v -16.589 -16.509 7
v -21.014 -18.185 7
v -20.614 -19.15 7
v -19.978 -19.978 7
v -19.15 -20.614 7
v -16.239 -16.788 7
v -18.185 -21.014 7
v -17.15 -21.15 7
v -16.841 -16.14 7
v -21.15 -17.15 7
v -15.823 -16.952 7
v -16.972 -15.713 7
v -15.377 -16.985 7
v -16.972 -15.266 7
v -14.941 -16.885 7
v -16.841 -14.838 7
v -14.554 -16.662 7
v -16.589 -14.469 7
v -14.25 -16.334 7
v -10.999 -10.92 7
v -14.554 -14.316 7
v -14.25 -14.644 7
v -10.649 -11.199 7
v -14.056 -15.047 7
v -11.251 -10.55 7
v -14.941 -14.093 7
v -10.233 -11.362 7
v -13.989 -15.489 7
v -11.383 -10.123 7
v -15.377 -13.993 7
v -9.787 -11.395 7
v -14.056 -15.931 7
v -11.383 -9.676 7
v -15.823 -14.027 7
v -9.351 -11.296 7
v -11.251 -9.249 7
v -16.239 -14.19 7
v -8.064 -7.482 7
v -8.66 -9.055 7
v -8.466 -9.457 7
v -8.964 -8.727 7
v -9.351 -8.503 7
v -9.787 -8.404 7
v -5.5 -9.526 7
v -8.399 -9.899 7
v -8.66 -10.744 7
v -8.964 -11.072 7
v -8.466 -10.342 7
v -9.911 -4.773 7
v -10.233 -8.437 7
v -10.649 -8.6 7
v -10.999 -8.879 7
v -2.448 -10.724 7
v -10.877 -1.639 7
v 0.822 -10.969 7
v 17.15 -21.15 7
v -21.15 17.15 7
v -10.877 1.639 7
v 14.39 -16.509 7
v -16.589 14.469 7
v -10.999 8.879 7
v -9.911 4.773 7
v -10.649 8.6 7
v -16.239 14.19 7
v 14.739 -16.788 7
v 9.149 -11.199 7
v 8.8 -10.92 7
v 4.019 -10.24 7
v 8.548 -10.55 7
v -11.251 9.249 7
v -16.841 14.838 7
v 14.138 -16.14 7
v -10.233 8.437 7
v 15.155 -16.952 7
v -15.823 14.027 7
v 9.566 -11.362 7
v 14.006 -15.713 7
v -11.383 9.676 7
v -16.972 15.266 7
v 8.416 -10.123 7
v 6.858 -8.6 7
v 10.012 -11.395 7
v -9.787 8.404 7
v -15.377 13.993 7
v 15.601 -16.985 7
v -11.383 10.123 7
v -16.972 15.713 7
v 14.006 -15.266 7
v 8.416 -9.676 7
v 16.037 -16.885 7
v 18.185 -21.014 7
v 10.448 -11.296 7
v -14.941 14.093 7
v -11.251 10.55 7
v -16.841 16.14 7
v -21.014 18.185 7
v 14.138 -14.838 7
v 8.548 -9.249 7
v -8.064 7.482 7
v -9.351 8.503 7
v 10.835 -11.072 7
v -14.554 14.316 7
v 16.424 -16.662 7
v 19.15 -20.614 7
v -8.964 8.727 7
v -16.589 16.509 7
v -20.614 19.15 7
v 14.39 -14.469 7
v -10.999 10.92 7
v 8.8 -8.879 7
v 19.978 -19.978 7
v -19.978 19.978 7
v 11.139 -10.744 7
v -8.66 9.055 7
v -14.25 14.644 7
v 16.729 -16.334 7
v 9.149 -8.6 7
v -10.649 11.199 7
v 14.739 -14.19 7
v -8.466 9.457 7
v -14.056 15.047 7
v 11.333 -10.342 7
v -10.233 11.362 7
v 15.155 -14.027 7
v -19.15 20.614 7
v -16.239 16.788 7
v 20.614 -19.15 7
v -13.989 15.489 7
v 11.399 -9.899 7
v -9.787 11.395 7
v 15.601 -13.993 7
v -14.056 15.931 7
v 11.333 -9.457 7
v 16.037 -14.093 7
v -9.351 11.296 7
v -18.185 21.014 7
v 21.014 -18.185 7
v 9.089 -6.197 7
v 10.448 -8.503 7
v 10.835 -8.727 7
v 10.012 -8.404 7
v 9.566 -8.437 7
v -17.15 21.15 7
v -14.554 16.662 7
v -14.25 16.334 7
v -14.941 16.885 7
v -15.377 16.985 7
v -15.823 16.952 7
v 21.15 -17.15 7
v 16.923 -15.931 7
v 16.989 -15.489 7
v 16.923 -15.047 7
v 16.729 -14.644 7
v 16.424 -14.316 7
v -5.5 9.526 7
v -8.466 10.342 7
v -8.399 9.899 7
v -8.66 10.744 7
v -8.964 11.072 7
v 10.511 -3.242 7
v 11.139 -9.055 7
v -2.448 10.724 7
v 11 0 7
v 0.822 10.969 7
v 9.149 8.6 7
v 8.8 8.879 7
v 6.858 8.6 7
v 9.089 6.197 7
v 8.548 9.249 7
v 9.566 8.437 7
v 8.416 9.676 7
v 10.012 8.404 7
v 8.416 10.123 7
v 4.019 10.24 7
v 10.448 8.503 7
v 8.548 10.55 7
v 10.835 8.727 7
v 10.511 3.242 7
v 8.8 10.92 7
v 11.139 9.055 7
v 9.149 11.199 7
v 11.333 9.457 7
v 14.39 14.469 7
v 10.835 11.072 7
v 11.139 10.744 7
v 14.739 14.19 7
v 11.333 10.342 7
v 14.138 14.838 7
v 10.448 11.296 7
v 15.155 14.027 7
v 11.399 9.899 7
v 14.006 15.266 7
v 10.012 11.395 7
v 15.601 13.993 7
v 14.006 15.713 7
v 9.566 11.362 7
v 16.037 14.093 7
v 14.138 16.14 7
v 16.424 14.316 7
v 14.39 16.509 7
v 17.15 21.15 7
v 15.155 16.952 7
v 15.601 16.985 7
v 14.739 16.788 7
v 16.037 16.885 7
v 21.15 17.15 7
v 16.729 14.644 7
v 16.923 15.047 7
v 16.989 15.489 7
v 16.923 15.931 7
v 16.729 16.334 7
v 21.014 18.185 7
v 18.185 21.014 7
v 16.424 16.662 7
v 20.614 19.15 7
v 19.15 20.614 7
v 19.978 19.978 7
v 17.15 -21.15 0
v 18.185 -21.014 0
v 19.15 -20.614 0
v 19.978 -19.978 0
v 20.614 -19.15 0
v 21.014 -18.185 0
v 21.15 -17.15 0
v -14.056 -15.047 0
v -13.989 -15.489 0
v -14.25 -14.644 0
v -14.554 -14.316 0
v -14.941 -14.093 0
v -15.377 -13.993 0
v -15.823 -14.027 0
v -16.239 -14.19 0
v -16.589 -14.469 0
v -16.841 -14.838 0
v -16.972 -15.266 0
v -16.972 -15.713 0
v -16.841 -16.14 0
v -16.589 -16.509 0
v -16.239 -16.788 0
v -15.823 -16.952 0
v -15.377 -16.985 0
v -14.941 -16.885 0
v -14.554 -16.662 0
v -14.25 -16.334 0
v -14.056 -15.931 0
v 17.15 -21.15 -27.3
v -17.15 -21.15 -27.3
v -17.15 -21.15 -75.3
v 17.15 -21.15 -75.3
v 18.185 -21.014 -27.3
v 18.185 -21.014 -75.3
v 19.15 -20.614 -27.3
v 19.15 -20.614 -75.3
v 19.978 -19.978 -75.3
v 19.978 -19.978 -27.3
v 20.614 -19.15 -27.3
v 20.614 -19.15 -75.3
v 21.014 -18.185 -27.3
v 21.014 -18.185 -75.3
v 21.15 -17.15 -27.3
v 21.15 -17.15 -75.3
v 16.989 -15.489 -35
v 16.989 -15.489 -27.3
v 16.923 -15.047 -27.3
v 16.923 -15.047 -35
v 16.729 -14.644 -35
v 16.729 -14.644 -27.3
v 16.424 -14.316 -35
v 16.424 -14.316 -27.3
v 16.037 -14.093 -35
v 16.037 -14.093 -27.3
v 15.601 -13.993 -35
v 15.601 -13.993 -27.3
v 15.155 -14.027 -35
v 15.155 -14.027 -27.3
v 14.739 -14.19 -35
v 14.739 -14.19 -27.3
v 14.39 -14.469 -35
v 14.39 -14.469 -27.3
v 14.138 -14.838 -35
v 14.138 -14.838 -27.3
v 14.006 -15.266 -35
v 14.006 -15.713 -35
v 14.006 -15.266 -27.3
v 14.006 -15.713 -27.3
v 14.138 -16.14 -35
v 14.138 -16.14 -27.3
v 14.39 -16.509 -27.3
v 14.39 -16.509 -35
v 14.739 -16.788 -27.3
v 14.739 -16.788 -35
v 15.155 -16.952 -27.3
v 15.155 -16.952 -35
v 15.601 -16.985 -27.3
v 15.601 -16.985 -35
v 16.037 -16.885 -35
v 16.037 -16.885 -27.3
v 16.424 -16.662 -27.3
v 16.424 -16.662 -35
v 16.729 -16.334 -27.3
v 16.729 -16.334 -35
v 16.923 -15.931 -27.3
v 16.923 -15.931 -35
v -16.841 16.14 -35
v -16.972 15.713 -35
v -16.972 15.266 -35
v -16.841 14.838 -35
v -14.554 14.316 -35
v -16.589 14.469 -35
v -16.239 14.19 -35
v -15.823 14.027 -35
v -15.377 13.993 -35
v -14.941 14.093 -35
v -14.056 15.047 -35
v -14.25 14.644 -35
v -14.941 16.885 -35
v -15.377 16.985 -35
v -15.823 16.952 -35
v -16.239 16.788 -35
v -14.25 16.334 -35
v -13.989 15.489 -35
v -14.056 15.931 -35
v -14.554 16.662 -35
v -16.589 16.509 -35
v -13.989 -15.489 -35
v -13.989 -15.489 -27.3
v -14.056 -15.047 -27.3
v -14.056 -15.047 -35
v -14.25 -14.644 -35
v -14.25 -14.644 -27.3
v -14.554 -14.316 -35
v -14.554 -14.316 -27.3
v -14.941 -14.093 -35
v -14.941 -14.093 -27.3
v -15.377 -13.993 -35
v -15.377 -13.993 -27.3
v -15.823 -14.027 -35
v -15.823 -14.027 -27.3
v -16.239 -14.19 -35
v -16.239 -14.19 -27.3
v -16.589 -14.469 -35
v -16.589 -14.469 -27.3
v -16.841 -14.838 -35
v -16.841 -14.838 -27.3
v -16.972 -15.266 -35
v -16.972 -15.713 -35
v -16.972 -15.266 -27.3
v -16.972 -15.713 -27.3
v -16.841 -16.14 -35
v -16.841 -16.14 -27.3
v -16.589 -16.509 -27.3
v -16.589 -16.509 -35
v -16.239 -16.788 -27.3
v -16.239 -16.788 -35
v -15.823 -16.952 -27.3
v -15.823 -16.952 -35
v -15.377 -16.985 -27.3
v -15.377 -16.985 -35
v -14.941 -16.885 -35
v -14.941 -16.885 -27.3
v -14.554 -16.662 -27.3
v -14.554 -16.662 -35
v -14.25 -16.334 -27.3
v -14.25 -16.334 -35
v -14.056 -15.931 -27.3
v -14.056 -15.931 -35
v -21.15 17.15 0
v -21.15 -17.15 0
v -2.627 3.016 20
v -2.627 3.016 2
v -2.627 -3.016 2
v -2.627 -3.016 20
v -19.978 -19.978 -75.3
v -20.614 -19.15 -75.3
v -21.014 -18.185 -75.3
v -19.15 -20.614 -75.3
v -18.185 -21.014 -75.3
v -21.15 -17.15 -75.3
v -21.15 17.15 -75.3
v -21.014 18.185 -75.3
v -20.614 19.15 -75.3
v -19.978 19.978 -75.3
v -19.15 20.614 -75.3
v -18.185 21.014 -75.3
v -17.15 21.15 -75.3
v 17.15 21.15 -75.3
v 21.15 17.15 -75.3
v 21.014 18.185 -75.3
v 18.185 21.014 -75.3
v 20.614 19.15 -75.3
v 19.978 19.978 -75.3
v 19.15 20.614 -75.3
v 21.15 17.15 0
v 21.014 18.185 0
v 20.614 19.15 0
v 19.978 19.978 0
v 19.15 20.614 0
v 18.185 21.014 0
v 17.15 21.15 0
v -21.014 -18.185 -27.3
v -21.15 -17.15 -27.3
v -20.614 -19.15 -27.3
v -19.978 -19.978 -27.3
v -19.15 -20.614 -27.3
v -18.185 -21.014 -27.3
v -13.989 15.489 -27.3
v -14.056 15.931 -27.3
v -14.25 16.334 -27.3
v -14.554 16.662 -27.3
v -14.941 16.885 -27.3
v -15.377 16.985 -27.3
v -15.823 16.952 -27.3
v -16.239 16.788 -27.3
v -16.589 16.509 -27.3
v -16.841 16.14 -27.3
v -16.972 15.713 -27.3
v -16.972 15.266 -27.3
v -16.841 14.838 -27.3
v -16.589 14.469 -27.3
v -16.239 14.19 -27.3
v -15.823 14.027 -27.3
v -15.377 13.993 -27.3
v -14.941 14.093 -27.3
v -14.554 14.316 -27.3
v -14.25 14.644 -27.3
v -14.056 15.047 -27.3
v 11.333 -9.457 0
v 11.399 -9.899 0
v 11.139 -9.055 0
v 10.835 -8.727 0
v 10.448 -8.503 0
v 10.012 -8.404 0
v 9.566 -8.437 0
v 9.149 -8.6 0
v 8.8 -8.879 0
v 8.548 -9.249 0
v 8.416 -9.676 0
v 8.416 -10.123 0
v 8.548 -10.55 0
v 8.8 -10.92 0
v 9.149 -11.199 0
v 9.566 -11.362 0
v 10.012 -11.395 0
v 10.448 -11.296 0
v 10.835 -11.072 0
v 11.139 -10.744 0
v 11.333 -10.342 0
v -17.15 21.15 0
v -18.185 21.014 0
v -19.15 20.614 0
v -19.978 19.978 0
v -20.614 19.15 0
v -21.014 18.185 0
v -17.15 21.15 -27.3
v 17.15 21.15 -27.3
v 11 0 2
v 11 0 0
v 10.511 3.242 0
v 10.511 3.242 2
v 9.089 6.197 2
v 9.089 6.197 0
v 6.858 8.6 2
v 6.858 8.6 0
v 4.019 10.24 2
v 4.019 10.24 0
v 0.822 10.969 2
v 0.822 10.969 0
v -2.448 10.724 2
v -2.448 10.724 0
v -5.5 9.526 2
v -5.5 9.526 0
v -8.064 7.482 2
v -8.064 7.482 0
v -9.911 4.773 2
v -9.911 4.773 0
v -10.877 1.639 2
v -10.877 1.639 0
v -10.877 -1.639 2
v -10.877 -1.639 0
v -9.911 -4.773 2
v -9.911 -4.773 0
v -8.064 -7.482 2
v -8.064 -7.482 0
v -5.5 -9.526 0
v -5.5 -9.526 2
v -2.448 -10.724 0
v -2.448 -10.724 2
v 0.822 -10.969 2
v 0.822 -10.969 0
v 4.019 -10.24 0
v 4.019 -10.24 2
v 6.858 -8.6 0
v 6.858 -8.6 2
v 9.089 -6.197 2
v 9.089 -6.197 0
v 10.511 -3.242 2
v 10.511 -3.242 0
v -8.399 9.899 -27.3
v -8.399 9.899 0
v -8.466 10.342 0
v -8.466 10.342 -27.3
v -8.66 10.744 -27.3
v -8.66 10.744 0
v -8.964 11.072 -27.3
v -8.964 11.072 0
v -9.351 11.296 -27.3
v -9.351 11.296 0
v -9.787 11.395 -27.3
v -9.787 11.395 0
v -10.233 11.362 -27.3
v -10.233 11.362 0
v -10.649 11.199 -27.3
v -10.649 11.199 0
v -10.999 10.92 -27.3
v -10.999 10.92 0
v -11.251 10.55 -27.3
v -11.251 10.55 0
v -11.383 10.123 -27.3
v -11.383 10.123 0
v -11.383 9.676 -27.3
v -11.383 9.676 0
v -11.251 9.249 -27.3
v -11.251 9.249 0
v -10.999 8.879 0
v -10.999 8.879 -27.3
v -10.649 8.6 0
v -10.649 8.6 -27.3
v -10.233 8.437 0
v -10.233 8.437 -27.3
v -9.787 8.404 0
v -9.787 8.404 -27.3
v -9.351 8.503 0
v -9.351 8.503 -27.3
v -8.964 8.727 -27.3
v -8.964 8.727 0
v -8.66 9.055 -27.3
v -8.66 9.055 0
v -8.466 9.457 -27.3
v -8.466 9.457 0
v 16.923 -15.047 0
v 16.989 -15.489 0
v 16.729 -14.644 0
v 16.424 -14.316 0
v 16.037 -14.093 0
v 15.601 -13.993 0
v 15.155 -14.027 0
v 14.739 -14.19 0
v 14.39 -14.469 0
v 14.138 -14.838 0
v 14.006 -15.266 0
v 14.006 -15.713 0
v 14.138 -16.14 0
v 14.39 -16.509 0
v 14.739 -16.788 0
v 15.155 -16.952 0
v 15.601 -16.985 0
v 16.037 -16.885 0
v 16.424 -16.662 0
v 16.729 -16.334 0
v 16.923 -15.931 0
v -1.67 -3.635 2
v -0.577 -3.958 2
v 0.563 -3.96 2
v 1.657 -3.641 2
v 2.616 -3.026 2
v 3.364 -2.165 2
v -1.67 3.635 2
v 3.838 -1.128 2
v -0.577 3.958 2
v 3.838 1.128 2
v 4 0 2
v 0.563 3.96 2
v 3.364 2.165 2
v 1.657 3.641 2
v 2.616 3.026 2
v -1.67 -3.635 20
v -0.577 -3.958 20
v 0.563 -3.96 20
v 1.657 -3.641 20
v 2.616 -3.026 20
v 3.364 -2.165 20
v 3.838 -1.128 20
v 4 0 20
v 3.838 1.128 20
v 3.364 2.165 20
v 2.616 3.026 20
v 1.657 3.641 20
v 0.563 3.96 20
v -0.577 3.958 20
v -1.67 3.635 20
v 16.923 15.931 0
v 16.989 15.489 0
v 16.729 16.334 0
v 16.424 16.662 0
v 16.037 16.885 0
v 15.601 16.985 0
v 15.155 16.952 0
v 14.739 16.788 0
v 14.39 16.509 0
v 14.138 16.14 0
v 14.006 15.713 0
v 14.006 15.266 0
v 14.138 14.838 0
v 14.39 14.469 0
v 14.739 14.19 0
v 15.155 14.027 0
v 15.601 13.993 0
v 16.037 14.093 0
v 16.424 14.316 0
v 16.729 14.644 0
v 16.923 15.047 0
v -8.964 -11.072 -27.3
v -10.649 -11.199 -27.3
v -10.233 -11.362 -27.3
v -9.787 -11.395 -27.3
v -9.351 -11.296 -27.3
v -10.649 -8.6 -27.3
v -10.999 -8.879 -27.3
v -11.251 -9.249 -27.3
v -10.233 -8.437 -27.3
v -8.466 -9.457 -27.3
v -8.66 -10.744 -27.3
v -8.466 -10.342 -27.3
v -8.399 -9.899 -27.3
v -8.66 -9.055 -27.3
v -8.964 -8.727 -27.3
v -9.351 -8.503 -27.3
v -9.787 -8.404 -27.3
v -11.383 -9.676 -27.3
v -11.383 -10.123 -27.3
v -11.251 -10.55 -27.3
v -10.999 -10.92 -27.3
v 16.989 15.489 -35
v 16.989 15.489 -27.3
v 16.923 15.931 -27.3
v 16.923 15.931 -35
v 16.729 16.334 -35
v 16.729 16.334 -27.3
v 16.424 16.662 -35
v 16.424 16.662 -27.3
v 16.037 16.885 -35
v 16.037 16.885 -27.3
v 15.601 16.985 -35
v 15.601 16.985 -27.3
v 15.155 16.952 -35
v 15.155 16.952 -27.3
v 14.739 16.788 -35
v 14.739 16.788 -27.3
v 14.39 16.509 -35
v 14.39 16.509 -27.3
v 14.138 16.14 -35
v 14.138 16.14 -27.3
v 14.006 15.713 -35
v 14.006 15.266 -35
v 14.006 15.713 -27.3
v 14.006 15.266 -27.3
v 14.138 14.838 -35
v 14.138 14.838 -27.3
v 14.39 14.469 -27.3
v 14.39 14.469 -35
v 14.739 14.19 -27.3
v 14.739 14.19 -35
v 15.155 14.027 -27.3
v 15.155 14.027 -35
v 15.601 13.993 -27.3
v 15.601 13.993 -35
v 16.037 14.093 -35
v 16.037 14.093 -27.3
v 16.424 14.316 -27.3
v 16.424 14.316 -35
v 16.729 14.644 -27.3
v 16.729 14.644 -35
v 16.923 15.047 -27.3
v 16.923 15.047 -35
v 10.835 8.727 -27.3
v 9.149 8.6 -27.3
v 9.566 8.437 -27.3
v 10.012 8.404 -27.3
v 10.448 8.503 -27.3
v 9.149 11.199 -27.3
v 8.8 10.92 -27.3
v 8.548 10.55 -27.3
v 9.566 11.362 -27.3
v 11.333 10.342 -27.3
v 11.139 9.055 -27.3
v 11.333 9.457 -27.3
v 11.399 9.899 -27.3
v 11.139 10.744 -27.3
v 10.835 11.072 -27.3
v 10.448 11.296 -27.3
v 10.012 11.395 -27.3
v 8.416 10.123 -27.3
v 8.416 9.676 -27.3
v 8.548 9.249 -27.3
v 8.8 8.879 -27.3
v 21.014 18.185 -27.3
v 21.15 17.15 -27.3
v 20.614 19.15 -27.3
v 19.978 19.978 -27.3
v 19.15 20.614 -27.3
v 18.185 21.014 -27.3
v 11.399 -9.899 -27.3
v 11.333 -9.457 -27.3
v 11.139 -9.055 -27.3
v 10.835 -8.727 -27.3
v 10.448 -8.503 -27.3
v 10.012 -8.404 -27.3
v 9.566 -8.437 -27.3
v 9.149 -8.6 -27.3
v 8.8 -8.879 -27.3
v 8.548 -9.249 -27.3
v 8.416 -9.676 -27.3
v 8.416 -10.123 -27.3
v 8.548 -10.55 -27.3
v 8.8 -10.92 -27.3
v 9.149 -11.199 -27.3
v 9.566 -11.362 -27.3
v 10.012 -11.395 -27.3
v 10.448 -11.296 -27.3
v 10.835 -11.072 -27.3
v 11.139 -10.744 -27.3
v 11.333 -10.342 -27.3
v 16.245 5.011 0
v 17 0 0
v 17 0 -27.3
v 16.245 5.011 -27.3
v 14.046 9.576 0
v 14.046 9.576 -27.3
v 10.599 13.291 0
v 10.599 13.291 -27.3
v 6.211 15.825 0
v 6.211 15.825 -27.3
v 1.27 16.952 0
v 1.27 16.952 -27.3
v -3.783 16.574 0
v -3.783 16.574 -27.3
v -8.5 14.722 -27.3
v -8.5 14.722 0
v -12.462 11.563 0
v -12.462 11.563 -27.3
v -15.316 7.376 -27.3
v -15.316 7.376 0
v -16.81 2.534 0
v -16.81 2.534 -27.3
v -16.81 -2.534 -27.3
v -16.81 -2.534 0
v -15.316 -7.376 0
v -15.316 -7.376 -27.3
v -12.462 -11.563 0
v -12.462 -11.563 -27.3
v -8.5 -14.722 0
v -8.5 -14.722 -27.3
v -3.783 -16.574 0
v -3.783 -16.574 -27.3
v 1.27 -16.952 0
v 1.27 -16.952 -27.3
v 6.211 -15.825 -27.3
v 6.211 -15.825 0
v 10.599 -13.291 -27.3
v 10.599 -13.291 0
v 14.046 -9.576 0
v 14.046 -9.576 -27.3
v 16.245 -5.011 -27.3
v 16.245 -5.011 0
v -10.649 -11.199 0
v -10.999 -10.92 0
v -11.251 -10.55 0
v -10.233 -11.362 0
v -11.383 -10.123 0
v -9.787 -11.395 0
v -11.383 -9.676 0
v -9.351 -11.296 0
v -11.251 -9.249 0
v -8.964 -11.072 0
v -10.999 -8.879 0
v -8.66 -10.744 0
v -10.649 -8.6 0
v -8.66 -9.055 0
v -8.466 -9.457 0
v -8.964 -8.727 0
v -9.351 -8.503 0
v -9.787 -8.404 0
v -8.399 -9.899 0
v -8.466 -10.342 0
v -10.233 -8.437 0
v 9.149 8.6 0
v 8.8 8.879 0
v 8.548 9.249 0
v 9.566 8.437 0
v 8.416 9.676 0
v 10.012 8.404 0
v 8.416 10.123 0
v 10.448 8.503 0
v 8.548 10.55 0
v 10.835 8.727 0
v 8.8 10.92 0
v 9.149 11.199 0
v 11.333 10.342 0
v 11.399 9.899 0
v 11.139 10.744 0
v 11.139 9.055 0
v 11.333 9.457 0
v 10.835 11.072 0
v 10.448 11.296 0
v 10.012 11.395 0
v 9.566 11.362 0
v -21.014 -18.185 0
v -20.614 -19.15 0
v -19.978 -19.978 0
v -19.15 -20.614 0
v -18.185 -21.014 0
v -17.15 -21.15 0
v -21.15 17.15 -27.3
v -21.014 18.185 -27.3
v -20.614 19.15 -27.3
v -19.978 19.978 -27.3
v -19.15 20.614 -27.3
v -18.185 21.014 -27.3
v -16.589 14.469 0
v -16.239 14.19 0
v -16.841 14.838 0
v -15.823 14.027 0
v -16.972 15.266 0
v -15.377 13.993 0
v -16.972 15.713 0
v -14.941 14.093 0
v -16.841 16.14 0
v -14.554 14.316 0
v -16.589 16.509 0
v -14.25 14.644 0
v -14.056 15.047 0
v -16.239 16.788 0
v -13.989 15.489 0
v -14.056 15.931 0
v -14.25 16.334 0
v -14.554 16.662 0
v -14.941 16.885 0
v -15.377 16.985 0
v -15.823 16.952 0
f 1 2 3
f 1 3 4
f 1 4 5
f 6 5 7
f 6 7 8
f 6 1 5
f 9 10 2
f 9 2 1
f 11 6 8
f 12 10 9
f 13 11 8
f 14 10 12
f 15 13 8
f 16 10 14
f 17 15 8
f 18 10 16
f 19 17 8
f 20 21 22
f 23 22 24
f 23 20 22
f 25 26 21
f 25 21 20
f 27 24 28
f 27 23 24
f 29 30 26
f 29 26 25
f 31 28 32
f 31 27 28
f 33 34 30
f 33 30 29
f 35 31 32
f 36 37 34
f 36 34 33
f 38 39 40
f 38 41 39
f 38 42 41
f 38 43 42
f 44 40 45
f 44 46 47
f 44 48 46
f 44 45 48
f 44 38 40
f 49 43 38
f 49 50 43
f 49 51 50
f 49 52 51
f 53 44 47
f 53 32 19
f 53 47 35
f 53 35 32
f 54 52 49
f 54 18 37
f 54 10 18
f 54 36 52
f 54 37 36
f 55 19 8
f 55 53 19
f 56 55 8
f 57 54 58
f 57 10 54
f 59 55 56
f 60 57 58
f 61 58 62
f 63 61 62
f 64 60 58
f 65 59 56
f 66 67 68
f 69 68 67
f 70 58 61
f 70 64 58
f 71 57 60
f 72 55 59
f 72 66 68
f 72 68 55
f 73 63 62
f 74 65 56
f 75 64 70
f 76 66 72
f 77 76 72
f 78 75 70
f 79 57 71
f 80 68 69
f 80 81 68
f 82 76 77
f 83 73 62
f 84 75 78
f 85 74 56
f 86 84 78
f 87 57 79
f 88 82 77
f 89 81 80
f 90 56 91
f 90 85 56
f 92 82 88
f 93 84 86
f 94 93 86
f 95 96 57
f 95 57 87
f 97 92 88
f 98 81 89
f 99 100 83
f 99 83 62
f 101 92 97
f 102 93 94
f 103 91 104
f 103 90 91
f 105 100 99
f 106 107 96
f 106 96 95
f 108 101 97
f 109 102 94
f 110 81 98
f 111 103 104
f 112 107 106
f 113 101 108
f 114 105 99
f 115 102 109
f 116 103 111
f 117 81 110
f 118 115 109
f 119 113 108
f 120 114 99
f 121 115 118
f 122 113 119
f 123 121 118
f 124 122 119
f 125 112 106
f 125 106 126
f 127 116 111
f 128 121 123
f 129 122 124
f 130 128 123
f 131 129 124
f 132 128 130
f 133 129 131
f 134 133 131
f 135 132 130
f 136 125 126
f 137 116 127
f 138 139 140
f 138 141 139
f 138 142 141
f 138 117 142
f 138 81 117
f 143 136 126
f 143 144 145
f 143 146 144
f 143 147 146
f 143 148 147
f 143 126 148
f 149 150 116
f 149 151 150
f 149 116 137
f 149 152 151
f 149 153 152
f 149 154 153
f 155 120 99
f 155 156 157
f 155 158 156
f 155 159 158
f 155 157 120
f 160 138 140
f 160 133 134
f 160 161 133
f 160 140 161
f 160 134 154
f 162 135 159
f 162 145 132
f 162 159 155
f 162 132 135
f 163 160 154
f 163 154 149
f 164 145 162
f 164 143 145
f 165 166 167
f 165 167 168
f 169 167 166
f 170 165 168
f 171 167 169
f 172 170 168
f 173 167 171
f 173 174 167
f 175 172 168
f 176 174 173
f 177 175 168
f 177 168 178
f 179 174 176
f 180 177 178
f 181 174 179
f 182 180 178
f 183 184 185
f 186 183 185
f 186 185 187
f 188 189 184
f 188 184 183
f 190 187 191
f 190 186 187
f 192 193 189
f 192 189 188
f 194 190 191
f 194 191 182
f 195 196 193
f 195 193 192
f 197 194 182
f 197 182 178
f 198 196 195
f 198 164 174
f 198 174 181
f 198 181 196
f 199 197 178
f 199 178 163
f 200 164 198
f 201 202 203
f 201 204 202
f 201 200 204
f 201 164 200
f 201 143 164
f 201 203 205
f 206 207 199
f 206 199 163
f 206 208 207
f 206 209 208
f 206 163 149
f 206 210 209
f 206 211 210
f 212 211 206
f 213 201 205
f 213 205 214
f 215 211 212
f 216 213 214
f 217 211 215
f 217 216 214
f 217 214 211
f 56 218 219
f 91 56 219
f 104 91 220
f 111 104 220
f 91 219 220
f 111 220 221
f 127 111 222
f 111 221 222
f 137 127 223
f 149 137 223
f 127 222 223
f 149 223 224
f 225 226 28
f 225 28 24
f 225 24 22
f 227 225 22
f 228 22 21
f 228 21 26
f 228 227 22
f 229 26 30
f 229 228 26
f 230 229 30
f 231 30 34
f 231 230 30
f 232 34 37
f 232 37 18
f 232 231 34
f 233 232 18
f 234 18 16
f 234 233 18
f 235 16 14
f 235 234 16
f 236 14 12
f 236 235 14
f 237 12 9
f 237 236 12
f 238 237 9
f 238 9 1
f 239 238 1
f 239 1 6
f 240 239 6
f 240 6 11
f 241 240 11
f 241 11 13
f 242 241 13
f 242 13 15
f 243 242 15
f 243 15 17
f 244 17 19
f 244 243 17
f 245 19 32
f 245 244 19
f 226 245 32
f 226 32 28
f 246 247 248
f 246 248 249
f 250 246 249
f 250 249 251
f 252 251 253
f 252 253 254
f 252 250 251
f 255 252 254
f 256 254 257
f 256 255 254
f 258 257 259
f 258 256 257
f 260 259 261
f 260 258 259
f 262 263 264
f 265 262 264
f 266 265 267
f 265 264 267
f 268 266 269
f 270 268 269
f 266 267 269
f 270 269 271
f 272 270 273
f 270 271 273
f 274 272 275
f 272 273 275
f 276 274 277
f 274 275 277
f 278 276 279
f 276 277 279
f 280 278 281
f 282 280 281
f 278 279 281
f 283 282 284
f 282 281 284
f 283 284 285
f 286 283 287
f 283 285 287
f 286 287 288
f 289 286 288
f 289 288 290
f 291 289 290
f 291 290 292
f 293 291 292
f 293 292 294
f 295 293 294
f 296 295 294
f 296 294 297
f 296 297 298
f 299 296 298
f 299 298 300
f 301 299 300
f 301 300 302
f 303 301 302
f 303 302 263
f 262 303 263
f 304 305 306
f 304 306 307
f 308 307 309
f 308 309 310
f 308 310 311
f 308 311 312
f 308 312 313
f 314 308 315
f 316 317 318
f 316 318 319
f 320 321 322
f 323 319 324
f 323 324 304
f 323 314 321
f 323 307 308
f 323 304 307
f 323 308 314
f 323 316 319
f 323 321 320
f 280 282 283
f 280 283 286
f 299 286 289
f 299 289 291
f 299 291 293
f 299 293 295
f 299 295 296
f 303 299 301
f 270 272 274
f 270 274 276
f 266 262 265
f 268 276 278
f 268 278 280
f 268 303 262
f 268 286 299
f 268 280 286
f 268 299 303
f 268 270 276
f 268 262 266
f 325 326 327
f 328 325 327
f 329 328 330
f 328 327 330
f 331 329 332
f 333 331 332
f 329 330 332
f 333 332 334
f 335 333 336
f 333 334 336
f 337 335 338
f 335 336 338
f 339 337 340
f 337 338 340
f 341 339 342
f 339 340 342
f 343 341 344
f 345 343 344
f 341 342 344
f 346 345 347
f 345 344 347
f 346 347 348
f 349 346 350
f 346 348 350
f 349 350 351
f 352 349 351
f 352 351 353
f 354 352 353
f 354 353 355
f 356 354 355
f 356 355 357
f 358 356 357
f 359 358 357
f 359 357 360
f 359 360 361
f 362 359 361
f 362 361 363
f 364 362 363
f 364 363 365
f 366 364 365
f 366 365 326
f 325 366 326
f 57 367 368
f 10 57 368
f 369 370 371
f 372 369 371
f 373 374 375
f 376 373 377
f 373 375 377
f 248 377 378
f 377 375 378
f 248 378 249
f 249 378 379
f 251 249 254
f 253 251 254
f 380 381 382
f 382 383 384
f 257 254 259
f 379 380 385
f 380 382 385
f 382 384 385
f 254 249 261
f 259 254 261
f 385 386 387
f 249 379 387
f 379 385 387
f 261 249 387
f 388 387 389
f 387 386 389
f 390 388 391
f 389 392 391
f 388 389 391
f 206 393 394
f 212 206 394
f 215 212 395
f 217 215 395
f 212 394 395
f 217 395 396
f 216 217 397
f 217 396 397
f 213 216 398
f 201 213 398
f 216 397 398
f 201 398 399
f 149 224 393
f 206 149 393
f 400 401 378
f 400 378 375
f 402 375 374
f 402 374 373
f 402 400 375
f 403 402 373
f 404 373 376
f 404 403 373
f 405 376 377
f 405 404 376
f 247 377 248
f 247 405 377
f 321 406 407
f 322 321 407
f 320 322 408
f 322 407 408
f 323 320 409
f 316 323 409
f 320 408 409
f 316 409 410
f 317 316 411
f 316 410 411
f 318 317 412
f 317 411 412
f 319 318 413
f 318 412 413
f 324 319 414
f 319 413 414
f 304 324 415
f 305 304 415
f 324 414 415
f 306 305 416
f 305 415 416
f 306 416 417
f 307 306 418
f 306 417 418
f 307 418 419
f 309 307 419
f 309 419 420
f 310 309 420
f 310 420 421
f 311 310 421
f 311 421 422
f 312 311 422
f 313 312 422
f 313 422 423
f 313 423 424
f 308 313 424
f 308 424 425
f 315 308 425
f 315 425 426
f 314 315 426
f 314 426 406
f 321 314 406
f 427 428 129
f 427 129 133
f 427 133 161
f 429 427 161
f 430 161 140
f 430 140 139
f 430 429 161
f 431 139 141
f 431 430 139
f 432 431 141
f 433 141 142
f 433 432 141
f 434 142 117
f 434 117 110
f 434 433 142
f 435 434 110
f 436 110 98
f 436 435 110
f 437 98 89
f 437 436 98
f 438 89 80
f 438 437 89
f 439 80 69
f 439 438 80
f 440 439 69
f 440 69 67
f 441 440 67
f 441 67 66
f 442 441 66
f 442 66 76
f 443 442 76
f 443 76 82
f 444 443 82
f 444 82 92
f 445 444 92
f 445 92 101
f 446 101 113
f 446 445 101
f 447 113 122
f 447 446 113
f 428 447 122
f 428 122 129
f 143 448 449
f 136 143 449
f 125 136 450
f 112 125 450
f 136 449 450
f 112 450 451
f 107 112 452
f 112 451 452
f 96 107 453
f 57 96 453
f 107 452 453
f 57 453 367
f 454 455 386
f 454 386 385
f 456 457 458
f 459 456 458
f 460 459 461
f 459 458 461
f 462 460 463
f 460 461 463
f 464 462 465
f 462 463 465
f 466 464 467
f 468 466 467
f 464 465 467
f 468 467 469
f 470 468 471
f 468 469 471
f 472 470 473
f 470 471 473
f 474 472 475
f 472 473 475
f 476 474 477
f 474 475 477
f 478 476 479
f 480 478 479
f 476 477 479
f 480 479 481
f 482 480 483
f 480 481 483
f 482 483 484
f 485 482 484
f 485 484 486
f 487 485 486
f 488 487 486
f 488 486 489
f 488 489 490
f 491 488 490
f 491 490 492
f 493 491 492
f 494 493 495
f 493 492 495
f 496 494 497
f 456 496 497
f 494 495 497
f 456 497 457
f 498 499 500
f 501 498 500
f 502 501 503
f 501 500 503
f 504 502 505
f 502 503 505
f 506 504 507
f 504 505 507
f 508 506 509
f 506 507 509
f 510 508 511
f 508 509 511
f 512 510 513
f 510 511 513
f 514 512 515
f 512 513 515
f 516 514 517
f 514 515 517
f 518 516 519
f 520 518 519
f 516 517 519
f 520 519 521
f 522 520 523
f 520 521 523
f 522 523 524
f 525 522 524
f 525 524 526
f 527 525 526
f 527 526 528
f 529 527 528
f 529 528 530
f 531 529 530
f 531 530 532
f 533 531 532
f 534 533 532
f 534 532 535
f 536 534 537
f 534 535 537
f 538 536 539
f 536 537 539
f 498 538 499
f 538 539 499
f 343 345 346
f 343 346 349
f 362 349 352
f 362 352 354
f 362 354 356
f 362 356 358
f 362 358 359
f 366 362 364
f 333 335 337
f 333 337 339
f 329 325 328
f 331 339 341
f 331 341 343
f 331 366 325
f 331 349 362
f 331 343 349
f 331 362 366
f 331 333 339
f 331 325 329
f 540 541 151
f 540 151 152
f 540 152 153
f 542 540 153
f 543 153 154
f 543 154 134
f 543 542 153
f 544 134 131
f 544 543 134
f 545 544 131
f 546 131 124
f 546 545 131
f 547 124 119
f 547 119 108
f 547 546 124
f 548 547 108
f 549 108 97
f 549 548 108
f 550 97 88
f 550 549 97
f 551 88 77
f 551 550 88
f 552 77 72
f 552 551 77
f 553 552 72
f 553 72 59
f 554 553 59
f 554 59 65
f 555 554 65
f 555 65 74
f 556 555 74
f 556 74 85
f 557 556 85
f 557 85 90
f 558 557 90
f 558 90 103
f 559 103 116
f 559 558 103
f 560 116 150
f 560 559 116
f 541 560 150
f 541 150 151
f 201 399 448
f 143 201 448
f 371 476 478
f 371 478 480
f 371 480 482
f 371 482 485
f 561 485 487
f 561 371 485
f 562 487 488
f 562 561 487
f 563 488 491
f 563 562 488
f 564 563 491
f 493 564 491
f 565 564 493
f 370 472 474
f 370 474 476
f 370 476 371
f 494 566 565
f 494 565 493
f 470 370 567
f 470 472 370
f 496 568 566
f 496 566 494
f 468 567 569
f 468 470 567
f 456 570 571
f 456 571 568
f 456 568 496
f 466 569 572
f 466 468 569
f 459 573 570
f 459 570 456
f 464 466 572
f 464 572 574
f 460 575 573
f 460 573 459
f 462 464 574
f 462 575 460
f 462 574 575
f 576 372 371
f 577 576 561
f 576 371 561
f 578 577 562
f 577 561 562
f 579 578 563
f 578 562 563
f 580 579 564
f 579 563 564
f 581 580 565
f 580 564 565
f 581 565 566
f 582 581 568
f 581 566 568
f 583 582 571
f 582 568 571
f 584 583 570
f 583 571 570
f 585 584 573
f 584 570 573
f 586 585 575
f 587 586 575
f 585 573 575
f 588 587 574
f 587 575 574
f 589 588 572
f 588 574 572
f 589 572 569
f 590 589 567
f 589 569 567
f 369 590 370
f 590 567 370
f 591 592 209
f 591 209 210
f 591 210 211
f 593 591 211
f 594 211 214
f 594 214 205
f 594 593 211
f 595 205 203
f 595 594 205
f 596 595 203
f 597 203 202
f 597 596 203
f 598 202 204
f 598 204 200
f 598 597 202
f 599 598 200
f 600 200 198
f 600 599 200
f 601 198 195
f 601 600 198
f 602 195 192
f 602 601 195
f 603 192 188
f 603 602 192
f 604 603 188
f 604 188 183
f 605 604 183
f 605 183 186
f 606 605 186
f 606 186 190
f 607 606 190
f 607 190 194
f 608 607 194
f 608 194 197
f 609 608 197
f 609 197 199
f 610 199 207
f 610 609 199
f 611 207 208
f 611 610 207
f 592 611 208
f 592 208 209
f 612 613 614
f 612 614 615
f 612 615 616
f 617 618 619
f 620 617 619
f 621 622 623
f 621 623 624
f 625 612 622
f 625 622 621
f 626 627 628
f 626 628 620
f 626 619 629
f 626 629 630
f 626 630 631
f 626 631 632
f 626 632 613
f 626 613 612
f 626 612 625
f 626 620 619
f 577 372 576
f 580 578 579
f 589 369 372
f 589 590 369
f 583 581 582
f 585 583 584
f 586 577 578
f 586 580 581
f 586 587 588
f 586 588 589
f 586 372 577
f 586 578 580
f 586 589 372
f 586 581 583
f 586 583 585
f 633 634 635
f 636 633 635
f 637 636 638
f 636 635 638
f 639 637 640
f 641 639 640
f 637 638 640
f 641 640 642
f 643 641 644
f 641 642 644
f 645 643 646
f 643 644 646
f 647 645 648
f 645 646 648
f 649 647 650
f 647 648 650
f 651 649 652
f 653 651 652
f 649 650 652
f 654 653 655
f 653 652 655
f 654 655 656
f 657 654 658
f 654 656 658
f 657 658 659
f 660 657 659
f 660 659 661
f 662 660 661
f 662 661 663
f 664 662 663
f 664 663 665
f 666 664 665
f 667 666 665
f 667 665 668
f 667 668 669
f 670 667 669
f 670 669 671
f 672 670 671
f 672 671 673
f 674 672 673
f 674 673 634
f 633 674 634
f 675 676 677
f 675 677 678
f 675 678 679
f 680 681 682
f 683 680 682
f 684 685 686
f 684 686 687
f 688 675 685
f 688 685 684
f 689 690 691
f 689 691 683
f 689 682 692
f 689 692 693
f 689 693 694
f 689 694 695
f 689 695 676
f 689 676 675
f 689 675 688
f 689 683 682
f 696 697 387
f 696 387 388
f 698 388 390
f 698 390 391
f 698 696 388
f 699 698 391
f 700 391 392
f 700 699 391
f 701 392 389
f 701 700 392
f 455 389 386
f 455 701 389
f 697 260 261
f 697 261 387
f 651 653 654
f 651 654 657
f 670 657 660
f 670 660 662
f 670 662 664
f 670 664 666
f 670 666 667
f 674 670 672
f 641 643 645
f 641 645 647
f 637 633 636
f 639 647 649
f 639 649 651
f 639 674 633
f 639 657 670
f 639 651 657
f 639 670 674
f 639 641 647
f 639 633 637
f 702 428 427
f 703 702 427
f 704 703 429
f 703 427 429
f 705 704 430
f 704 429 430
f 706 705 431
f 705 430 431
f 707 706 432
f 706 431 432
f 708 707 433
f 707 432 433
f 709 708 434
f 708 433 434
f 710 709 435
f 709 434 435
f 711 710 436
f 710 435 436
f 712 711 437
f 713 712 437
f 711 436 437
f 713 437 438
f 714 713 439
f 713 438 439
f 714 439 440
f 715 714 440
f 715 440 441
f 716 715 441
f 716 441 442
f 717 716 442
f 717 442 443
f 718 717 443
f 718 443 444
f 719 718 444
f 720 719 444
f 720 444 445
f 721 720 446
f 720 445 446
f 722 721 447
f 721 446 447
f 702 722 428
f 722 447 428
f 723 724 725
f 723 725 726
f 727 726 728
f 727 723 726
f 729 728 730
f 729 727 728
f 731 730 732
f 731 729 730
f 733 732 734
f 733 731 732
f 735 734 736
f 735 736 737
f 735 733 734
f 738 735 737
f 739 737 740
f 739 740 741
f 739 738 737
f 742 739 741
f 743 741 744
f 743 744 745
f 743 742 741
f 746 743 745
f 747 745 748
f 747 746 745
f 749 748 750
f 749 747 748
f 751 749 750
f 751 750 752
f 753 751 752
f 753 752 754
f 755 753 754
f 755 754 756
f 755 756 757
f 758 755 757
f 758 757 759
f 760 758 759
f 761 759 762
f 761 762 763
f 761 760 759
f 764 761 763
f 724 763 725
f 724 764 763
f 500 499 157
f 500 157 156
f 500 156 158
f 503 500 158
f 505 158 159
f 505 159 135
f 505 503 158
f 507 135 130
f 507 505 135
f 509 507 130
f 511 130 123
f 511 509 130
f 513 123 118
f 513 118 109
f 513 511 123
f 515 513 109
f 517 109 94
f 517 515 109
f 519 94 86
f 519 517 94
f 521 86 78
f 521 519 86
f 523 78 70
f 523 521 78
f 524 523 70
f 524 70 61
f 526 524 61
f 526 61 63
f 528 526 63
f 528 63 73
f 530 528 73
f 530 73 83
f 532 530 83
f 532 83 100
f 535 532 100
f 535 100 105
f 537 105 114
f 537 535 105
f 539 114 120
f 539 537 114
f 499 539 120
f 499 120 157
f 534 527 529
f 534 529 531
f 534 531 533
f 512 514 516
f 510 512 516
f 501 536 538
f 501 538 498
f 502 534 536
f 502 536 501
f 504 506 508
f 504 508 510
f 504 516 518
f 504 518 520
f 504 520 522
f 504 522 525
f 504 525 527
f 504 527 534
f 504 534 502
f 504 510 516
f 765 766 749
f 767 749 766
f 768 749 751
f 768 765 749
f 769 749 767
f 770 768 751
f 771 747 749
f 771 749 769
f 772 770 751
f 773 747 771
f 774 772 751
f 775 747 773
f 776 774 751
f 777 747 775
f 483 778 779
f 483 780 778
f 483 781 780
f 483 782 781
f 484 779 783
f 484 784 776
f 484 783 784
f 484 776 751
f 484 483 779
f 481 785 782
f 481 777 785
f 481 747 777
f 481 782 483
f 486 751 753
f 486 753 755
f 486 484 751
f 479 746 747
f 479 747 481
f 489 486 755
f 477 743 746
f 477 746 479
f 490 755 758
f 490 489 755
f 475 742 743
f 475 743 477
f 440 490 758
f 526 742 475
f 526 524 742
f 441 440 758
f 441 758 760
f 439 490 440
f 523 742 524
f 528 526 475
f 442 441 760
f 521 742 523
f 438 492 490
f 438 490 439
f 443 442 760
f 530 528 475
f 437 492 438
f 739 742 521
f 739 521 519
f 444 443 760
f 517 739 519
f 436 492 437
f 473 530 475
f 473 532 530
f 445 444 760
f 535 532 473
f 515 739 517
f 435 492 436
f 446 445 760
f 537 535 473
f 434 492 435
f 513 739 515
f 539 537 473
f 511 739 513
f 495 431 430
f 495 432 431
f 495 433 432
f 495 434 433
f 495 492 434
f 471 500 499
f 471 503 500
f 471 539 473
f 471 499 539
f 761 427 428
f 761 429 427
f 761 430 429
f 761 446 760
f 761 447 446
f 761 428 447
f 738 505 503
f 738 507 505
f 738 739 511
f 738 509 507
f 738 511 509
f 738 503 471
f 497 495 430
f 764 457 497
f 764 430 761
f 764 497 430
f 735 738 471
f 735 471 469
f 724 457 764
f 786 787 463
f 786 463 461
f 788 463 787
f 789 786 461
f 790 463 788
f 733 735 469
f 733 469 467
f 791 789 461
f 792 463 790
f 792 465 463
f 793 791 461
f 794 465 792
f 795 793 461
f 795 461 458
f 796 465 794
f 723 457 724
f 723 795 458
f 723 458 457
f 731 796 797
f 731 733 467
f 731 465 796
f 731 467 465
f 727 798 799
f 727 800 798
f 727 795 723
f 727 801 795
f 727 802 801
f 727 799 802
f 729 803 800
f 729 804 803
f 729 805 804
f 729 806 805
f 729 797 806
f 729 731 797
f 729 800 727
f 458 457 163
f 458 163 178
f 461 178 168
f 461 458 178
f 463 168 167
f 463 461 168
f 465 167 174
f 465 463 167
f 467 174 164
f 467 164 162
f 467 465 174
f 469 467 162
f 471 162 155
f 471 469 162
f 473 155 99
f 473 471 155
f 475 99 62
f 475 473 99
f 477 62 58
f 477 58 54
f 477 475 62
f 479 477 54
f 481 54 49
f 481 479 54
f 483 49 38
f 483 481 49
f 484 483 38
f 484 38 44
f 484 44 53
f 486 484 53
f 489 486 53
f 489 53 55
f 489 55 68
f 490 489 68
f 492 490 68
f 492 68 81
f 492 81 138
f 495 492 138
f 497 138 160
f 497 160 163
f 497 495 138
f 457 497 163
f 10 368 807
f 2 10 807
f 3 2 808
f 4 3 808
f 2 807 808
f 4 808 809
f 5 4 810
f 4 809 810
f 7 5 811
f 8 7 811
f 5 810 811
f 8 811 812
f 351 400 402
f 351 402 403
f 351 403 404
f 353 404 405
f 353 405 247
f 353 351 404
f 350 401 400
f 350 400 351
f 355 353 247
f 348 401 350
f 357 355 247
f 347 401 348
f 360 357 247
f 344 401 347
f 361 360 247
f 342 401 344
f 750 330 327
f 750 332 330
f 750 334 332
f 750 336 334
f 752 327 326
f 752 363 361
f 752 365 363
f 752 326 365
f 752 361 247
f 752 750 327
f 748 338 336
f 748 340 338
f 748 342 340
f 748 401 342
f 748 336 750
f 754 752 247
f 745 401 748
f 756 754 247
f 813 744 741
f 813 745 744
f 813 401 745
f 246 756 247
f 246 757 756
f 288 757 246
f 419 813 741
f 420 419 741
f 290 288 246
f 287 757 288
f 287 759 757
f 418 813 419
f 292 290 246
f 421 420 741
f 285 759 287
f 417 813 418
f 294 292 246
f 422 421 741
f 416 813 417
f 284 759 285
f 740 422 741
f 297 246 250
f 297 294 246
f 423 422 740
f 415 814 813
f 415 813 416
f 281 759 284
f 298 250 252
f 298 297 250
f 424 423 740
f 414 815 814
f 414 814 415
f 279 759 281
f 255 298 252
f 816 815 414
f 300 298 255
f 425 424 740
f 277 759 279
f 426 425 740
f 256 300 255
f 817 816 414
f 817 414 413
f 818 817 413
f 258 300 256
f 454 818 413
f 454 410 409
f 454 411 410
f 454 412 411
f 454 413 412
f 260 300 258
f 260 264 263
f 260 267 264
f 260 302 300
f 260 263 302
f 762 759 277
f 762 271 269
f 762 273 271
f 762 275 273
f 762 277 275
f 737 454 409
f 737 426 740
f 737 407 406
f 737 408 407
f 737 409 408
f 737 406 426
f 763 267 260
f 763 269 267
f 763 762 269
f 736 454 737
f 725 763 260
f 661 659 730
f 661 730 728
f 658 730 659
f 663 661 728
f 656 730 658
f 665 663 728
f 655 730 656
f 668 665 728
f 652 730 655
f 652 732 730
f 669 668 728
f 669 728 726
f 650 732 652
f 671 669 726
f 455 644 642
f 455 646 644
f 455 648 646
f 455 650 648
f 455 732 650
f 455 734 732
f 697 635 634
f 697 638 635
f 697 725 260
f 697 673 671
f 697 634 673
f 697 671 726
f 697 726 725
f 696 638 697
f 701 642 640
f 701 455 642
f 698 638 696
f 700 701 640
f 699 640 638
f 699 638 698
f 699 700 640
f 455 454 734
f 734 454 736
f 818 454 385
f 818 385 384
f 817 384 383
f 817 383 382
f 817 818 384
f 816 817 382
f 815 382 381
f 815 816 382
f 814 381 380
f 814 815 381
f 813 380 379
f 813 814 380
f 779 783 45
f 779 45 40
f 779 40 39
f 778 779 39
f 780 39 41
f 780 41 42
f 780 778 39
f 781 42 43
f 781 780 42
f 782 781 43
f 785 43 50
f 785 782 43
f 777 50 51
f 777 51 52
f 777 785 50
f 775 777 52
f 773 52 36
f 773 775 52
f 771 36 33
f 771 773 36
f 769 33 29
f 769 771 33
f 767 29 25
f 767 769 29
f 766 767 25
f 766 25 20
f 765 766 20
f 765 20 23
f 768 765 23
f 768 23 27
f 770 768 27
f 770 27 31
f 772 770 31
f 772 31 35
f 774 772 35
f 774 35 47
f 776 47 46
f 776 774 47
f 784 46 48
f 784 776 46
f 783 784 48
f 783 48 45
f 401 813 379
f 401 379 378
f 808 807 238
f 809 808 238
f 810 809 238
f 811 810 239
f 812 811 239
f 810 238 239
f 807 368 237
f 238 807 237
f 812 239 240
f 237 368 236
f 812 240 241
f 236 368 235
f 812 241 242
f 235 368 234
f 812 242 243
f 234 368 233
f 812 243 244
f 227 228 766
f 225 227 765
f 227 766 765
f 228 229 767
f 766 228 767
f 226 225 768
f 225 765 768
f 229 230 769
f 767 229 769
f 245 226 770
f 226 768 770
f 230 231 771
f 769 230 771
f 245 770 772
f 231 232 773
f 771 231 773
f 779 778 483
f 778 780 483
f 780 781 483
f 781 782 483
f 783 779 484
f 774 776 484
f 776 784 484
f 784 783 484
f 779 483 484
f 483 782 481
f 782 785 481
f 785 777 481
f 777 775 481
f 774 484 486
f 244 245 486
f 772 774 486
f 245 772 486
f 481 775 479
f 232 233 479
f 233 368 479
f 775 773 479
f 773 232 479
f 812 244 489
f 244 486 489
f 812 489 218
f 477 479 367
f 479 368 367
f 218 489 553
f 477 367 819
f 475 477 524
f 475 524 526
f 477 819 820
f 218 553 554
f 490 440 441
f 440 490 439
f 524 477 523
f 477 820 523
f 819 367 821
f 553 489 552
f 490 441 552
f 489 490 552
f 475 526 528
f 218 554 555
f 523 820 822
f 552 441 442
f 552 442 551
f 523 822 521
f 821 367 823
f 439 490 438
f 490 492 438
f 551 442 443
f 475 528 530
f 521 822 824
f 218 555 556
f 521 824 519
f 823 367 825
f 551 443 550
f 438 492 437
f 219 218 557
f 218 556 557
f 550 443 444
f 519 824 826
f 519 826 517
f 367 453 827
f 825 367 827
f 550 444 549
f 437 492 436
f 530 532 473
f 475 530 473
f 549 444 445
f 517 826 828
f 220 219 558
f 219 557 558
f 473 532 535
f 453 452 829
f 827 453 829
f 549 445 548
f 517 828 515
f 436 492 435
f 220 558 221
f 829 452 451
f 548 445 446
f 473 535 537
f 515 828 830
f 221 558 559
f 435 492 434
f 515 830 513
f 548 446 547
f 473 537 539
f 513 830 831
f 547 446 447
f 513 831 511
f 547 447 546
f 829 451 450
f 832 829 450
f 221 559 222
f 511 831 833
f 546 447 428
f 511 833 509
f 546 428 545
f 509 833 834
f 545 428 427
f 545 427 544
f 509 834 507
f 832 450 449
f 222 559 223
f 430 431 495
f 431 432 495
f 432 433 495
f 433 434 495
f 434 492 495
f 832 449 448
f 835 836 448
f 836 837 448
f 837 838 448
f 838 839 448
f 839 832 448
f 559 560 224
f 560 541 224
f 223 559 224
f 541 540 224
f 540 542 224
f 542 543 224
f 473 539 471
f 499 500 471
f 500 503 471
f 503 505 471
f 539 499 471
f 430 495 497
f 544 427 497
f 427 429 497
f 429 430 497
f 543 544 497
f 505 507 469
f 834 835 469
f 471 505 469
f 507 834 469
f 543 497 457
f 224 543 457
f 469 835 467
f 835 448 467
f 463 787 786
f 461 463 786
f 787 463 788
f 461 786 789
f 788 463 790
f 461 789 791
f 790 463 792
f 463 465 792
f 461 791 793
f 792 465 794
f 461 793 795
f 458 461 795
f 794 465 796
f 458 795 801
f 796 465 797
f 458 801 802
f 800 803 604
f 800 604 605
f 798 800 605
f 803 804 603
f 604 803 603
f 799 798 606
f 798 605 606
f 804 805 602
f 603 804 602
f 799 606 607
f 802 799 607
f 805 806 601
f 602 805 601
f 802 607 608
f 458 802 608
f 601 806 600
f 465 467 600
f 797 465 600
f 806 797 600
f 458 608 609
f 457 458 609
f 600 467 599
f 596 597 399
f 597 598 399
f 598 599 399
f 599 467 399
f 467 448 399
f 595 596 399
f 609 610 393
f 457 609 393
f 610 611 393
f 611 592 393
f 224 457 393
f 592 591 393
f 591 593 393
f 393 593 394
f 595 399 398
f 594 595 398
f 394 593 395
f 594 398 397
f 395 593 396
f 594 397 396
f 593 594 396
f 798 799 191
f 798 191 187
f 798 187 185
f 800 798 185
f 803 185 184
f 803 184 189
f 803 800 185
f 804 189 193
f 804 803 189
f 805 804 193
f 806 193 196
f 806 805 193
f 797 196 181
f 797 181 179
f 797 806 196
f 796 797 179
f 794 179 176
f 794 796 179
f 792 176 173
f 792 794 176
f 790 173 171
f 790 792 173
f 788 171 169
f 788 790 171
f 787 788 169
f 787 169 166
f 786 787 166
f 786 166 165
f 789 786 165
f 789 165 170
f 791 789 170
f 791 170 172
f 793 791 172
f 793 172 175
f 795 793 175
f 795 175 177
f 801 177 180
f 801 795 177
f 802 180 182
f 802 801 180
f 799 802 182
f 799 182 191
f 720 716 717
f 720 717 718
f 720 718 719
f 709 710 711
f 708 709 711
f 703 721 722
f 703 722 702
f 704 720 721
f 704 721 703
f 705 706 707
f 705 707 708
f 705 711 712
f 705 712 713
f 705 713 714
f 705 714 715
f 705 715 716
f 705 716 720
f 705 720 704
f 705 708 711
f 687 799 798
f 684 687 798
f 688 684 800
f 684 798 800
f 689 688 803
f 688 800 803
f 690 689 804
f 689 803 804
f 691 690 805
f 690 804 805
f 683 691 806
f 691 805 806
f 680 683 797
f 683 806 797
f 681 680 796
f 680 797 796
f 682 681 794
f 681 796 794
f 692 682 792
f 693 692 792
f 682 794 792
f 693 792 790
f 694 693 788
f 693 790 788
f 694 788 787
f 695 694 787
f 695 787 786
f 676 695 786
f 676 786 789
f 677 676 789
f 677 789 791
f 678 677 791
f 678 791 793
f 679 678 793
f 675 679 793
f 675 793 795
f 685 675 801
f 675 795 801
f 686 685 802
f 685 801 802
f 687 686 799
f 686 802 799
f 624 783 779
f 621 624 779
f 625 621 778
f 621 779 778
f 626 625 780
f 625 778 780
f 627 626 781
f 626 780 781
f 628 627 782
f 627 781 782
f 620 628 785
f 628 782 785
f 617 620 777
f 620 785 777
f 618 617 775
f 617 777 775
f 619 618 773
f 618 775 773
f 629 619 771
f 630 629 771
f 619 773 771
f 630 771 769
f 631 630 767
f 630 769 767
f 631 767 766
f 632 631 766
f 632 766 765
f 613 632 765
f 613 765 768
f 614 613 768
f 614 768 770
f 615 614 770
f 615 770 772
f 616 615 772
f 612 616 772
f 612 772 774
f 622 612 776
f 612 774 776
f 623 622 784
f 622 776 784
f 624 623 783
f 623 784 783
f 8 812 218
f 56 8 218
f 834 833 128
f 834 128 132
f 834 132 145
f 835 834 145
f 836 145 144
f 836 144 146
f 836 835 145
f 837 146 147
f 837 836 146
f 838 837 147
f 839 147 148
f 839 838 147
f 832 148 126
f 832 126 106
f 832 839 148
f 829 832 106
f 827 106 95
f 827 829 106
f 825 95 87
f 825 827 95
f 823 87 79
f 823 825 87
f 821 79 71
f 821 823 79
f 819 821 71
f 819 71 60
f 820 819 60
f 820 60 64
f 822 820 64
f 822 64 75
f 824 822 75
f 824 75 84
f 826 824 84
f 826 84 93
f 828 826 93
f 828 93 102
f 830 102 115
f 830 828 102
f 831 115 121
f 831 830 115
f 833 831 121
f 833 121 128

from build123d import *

# Parameters (mm, degrees)
F0_R      = 1.5
F0_R_2    = 17
F0_R_3    = 11
F1_DEPTH  = 7
F2_DEPTH  = 20
F3_DEPTH  = 2
F3_FACE_R = 11
F4_DEPTH  = 75.3
F5_DEPTH  = 27.3
F6_DEPTH  = 35


with BuildPart() as f1:
    # F0 (on Top) → F1 (new body)
    with BuildSketch(Plane.XY):
        with BuildLine():
            ThreePointArc((-21.15, -17.15), (-19.9784271247, -19.9784271247), (-17.15, -21.15))
            Line((-17.15, -21.15), (17.15, -21.15))
            ThreePointArc((17.15, -21.15), (19.9784271247, -19.9784271247), (21.15, -17.15))
            Line((21.15, -17.15), (21.15, 17.15))
            ThreePointArc((21.15, 17.15), (19.9784271247, 19.9784271247), (17.15, 21.15))
            Line((17.15, 21.15), (-17.15, 21.15))
            ThreePointArc((-17.15, 21.15), (-19.9784271247, 19.9784271247), (-21.15, 17.15))
            Line((-21.15, 17.15), (-21.15, -17.15))
        make_face()
        with Locations((-15.4891740419, -15.4891740419)):
            Circle(F0_R, mode=Mode.SUBTRACT)
        with Locations((15.4891740419, -15.4891740419)):
            Circle(F0_R, mode=Mode.SUBTRACT)
        Circle(F0_R_2, mode=Mode.SUBTRACT)
        with Locations((-15.4891740419, 15.4891740419)):
            Circle(F0_R, mode=Mode.SUBTRACT)
        with Locations((15.4891740419, 15.4891740419)):
            Circle(F0_R, mode=Mode.SUBTRACT)
        Circle(F0_R_2)
        with Locations((-9.8994949366, -9.8994949366)):
            Circle(F0_R, mode=Mode.SUBTRACT)
        with Locations((9.8994949366, -9.8994949366)):
            Circle(F0_R, mode=Mode.SUBTRACT)
        Circle(F0_R_3, mode=Mode.SUBTRACT)
        with Locations((-9.8994949366, 9.8994949366)):
            Circle(F0_R, mode=Mode.SUBTRACT)
        with Locations((9.8994949366, 9.8994949366)):
            Circle(F0_R, mode=Mode.SUBTRACT)
    extrude(amount=F1_DEPTH)


with BuildPart() as f2:
    # F0 (on Top) → F2 (new body)
    with BuildSketch(Plane.XY):
        with BuildLine():
            Line((-2.627499033, 3.0159988116), (-2.627499033, -3.0159988116))
            ThreePointArc((-2.627499033, -3.0159988116), (4, 0), (-2.627499033, 3.0159988116))
        make_face()
    extrude(amount=F2_DEPTH)

    # F0 (on Top) → F3 (join)
    with BuildSketch(Plane.XY):
        Circle(F0_R_3)
        with BuildLine():
            ThreePointArc((-2.627499033, 3.0159988116), (4, 0), (-2.627499033, -3.0159988116))
            Line((-2.627499033, -3.0159988116), (-2.627499033, 3.0159988116))
        make_face(mode=Mode.SUBTRACT)
    extrude(amount=F3_DEPTH)

    # F0 (on Top) + F3_face (on face) → F4 (join)
    with BuildSketch(Plane.XY):
        with BuildLine():
            ThreePointArc((-21.15, -17.15), (-19.9784271247, -19.9784271247), (-17.15, -21.15))
            Line((-17.15, -21.15), (17.15, -21.15))
            ThreePointArc((17.15, -21.15), (19.9784271247, -19.9784271247), (21.15, -17.15))
            Line((21.15, -17.15), (21.15, 17.15))
            ThreePointArc((21.15, 17.15), (19.9784271247, 19.9784271247), (17.15, 21.15))
            Line((17.15, 21.15), (-17.15, 21.15))
            ThreePointArc((-17.15, 21.15), (-19.9784271247, 19.9784271247), (-21.15, 17.15))
            Line((-21.15, 17.15), (-21.15, -17.15))
        make_face()
        with Locations((-15.4891740419, -15.4891740419)):
            Circle(F0_R, mode=Mode.SUBTRACT)
        with Locations((15.4891740419, -15.4891740419)):
            Circle(F0_R, mode=Mode.SUBTRACT)
        Circle(F0_R_2, mode=Mode.SUBTRACT)
        with Locations((-15.4891740419, 15.4891740419)):
            Circle(F0_R, mode=Mode.SUBTRACT)
        with Locations((15.4891740419, 15.4891740419)):
            Circle(F0_R, mode=Mode.SUBTRACT)
        Circle(F0_R_2)
        with Locations((-9.8994949366, -9.8994949366)):
            Circle(F0_R, mode=Mode.SUBTRACT)
        with Locations((9.8994949366, -9.8994949366)):
            Circle(F0_R, mode=Mode.SUBTRACT)
        Circle(F0_R_3, mode=Mode.SUBTRACT)
        with Locations((-9.8994949366, 9.8994949366)):
            Circle(F0_R, mode=Mode.SUBTRACT)
        with Locations((9.8994949366, 9.8994949366)):
            Circle(F0_R, mode=Mode.SUBTRACT)
        Circle(F0_R_3)
        with BuildLine():
            ThreePointArc((-2.627499033, 3.0159988116), (4, 0), (-2.627499033, -3.0159988116))
            Line((-2.627499033, -3.0159988116), (-2.627499033, 3.0159988116))
        make_face(mode=Mode.SUBTRACT)
        with BuildLine():
            Line((-2.627499033, 3.0159988116), (-2.627499033, -3.0159988116))
            ThreePointArc((-2.627499033, -3.0159988116), (4, 0), (-2.627499033, 3.0159988116))
        make_face()
        with Locations((15.4891740419, 15.4891740419)):
            Circle(F0_R)
        with Locations((9.8994949366, -9.8994949366)):
            Circle(F0_R)
        with Locations((-15.4891740419, 15.4891740419)):
            Circle(F0_R)
        with Locations((-9.8994949366, 9.8994949366)):
            Circle(F0_R)
        with Locations((15.4891740419, -15.4891740419)):
            Circle(F0_R)
        with Locations((9.8994949366, 9.8994949366)):
            Circle(F0_R)
        with Locations((-9.8994949366, -9.8994949366)):
            Circle(F0_R)
        with Locations((-15.4891740419, -15.4891740419)):
            Circle(F0_R)
    with BuildSketch(Plane(origin=(0, 0, 0), x_dir=(1, 0, 0), z_dir=(0, 0, -1))):
        Circle(F3_FACE_R)
    extrude(amount=-F4_DEPTH, dir=(0, 0, 1))

    # F0 (on Top) → F5 (cut)
    with BuildSketch(Plane.XY):
        with BuildLine():
            ThreePointArc((-21.15, -17.15), (-19.9784271247, -19.9784271247), (-17.15, -21.15))
            Line((-17.15, -21.15), (17.15, -21.15))
            ThreePointArc((17.15, -21.15), (19.9784271247, -19.9784271247), (21.15, -17.15))
            Line((21.15, -17.15), (21.15, 17.15))
            ThreePointArc((21.15, 17.15), (19.9784271247, 19.9784271247), (17.15, 21.15))
            Line((17.15, 21.15), (-17.15, 21.15))
            ThreePointArc((-17.15, 21.15), (-19.9784271247, 19.9784271247), (-21.15, 17.15))
            Line((-21.15, 17.15), (-21.15, -17.15))
        make_face()
        with Locations((-15.4891740419, -15.4891740419)):
            Circle(F0_R, mode=Mode.SUBTRACT)
        with Locations((15.4891740419, -15.4891740419)):
            Circle(F0_R, mode=Mode.SUBTRACT)
        Circle(F0_R_2, mode=Mode.SUBTRACT)
        with Locations((-15.4891740419, 15.4891740419)):
            Circle(F0_R, mode=Mode.SUBTRACT)
        with Locations((15.4891740419, 15.4891740419)):
            Circle(F0_R, mode=Mode.SUBTRACT)
        with Locations((15.4891740419, -15.4891740419)):
            Circle(F0_R)
        with Locations((15.4891740419, 15.4891740419)):
            Circle(F0_R)
        with Locations((9.8994949366, 9.8994949366)):
            Circle(F0_R)
        with Locations((9.8994949366, -9.8994949366)):
            Circle(F0_R)
        with Locations((-9.8994949366, -9.8994949366)):
            Circle(F0_R)
        with Locations((-9.8994949366, 9.8994949366)):
            Circle(F0_R)
        with Locations((-15.4891740419, 15.4891740419)):
            Circle(F0_R)
        with Locations((-15.4891740419, -15.4891740419)):
            Circle(F0_R)
    extrude(amount=-F5_DEPTH, mode=Mode.SUBTRACT)

    # F0 (on Top) → F6 (cut)
    with BuildSketch(Plane.XY):
        with Locations((15.4891740419, -15.4891740419)):
            Circle(F0_R)
        with Locations((-15.4891740419, 15.4891740419)):
            Circle(F0_R)
        with Locations((15.4891740419, 15.4891740419)):
            Circle(F0_R)
        with Locations((-15.4891740419, -15.4891740419)):
            Circle(F0_R)
    extrude(amount=-F6_DEPTH, mode=Mode.SUBTRACT)


solid = Compound([f1.part, f2.part])
